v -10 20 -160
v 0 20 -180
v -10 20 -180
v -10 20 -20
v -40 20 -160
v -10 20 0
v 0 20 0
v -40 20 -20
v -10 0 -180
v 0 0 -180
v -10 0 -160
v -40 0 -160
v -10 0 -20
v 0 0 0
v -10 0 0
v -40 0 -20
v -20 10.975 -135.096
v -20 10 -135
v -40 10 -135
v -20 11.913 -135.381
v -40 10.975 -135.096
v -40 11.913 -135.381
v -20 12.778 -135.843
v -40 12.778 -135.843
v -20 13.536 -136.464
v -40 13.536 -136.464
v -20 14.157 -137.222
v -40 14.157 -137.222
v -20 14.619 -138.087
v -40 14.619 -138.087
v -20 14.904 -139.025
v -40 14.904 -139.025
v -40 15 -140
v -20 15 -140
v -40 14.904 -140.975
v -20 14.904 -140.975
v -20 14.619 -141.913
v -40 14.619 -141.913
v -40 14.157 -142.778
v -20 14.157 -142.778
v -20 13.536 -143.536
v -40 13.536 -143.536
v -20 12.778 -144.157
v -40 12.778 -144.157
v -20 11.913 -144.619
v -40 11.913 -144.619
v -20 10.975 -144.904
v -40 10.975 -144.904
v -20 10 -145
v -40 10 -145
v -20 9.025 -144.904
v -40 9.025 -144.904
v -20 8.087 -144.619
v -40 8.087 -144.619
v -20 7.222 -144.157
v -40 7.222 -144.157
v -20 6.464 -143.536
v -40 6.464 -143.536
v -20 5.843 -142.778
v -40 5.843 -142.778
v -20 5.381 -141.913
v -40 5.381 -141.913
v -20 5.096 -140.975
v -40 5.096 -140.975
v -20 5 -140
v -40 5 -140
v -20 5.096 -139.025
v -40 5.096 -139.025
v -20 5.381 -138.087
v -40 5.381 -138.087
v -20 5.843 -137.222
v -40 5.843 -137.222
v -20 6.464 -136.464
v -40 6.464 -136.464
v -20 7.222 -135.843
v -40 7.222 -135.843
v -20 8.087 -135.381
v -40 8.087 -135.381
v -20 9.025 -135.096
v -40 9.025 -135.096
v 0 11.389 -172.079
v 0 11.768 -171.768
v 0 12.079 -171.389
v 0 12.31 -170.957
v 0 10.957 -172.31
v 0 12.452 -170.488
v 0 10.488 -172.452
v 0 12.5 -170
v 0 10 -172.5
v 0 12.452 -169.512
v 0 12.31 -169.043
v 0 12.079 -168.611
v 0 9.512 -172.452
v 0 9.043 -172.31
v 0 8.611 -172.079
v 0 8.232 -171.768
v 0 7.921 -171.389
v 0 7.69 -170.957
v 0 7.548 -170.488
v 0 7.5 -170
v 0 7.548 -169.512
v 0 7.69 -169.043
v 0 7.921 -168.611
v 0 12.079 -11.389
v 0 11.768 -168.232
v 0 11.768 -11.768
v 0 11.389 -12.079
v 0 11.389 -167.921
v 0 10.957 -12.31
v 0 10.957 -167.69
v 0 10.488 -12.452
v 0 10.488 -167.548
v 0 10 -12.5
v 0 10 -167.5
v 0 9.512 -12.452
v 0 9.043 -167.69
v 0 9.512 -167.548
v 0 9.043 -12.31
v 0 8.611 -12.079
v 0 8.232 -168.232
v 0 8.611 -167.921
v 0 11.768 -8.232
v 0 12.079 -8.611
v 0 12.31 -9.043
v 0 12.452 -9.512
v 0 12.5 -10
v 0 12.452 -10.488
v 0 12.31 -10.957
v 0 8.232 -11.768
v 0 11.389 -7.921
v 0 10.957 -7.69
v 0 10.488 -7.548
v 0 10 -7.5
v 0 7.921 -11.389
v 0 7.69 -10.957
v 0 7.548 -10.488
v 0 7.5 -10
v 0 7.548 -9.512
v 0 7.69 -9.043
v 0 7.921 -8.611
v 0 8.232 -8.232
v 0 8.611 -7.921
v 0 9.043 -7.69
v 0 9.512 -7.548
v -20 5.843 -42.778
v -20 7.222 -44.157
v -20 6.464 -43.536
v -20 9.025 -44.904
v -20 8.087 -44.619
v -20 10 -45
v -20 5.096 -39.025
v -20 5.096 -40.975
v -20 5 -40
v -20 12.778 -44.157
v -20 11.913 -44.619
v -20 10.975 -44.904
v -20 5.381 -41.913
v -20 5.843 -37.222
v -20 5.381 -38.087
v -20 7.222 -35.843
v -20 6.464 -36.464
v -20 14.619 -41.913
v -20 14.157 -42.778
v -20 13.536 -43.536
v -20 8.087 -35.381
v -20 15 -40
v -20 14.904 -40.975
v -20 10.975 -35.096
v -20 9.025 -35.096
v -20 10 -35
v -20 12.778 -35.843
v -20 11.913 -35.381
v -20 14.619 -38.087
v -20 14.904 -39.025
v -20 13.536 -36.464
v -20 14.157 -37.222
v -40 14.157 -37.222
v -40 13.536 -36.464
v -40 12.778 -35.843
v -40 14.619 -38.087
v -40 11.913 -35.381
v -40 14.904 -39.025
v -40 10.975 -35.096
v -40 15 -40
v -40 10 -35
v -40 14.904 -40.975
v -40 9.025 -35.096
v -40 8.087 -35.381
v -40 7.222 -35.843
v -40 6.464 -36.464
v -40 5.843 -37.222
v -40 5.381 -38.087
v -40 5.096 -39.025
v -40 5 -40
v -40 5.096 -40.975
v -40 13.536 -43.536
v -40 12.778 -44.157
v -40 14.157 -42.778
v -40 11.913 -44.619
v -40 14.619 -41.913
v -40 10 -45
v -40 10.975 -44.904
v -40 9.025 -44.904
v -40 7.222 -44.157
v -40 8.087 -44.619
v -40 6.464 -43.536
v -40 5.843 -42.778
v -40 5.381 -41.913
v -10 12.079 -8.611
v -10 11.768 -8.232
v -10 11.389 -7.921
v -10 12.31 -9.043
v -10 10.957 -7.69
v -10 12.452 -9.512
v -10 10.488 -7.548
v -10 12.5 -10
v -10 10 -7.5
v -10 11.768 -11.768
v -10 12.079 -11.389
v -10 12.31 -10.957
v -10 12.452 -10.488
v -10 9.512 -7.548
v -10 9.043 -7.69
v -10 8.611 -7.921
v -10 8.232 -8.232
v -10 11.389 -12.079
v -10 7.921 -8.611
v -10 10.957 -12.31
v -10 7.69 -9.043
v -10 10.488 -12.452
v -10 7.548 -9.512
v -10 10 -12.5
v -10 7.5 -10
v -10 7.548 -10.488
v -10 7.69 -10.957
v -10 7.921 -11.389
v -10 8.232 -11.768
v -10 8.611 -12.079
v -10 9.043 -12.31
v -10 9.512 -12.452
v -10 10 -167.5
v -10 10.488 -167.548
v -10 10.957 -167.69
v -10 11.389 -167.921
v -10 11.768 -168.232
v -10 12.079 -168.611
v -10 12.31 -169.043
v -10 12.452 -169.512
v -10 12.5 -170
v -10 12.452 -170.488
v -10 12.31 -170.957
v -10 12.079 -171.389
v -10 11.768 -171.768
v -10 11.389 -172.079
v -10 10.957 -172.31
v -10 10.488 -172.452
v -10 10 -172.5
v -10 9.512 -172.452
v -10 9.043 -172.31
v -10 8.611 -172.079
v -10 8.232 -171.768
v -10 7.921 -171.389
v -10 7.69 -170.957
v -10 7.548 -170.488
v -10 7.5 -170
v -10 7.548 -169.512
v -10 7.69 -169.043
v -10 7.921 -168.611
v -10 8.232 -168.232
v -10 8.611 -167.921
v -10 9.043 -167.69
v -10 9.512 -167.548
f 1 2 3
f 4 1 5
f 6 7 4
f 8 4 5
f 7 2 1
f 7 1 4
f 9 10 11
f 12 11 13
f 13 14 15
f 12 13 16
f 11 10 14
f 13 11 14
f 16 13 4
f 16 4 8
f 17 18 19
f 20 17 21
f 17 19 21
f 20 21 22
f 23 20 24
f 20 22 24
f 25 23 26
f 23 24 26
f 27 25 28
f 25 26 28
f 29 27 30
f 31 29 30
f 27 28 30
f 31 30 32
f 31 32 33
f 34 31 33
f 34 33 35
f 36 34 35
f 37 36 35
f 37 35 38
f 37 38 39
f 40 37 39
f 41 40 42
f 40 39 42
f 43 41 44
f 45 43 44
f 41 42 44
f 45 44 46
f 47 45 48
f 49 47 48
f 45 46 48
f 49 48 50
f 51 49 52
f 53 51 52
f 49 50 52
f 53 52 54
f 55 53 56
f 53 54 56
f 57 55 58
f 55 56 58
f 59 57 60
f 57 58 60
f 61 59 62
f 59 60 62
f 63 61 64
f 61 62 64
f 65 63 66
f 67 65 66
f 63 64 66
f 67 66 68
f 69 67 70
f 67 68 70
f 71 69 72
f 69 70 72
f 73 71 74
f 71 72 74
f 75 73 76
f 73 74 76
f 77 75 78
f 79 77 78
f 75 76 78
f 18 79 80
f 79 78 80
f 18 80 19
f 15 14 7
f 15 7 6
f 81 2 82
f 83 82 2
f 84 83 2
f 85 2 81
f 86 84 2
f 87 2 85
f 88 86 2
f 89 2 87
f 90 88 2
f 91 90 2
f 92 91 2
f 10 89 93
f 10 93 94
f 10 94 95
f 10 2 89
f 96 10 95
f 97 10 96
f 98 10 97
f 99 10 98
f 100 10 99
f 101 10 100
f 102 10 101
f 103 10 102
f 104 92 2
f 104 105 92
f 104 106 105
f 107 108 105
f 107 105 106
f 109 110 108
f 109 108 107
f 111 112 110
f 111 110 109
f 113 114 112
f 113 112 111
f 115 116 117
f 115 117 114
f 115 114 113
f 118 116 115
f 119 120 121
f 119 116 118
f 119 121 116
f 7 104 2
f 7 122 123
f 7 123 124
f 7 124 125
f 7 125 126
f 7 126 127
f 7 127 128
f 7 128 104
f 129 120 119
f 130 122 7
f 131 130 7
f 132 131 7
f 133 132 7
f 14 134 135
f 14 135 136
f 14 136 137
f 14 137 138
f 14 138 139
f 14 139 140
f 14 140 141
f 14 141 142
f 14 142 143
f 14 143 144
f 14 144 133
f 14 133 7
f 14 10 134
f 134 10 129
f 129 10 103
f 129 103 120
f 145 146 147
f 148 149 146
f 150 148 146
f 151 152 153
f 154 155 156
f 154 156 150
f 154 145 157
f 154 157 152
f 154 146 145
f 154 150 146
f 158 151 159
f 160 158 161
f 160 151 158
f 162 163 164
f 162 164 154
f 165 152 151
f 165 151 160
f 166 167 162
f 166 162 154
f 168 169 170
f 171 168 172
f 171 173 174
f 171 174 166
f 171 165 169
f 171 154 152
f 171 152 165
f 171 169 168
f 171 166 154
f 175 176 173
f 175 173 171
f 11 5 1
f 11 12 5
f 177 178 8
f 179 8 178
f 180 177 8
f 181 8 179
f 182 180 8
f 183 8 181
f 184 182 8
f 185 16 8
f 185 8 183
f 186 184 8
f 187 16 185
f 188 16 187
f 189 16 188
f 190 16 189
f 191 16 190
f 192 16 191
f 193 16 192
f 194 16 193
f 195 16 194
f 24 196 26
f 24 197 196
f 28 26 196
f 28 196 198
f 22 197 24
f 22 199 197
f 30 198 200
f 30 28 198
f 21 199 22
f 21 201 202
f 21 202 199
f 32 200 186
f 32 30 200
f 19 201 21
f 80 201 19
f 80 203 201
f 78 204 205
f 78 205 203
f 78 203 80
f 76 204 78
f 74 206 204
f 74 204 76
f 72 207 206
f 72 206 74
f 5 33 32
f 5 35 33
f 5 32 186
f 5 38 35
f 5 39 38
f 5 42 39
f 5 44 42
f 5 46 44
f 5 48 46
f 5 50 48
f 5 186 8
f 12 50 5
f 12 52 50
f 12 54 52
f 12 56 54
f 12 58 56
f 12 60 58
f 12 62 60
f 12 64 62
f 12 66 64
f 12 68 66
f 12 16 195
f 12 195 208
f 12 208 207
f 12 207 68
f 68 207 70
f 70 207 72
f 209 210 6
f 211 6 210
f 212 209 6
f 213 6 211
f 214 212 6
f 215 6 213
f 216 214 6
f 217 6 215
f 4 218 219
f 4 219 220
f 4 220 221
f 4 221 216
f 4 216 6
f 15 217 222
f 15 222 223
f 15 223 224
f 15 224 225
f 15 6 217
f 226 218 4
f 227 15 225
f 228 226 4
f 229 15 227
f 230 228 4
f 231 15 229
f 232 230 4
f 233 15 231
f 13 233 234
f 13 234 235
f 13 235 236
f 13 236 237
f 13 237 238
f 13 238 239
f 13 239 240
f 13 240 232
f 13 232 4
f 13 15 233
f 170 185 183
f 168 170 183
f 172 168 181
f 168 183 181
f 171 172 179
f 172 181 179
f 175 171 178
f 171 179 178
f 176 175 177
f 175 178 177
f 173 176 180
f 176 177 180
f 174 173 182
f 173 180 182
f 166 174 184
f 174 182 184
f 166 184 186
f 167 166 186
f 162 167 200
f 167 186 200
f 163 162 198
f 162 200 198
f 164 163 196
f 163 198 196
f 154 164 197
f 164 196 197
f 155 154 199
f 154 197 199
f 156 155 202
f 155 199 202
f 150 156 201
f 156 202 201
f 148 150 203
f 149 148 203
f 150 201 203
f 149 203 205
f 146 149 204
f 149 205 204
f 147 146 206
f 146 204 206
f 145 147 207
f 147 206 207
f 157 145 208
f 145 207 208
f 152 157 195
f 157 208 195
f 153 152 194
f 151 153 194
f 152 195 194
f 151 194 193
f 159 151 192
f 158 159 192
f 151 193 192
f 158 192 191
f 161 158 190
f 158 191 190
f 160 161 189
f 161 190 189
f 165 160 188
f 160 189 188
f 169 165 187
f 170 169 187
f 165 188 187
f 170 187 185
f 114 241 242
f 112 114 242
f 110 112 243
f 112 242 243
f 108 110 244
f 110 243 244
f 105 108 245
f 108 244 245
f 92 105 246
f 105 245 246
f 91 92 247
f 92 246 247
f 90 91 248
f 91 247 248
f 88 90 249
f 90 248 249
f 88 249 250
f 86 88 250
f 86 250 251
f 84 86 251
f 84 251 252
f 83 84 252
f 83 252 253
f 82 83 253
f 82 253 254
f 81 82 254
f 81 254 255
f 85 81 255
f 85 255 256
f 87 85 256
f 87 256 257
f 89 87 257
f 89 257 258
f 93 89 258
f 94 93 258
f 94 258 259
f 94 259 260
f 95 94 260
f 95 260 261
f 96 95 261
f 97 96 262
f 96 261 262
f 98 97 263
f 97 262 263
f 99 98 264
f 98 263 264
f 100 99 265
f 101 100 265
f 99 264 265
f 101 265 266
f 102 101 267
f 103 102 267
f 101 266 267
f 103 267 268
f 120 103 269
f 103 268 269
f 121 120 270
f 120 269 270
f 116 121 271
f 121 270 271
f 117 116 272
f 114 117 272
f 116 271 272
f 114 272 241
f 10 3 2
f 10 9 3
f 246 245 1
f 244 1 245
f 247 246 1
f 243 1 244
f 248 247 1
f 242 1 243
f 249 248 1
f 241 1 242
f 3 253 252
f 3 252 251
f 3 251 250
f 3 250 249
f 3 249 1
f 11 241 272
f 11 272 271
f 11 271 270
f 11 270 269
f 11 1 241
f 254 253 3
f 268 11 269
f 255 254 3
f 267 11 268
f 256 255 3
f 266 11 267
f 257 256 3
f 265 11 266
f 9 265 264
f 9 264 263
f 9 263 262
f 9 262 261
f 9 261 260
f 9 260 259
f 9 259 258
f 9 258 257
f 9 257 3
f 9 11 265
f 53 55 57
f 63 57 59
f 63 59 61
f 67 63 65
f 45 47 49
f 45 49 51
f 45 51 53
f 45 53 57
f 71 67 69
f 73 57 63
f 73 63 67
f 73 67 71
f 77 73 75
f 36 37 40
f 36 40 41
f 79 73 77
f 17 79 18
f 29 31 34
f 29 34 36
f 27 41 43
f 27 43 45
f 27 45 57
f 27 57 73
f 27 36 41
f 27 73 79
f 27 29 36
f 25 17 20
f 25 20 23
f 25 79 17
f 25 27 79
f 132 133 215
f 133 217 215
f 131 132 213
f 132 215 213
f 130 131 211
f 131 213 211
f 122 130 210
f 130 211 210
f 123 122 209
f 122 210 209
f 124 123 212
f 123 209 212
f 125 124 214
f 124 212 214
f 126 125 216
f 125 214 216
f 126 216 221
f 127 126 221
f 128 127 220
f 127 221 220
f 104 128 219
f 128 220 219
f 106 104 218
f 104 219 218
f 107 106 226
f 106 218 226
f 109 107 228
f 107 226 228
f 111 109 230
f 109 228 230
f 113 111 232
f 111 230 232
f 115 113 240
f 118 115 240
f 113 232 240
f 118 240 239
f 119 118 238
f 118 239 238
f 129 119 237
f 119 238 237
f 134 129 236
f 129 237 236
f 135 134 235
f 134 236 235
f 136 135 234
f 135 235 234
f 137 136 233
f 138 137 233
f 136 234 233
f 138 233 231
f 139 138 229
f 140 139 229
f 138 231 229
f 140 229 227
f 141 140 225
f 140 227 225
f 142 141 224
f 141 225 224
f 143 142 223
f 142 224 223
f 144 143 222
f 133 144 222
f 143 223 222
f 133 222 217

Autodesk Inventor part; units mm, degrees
ref_plane "YZ Plane" through (0, 0, 0) normal (1, 0, 0) x (0, 1, 0)
ref_plane "XZ Plane" through (0, 0, 0) normal (0, 1, 0) x (-1, 0, 0)
ref_plane "XY Plane" through (0, 0, 0) normal (0, 0, 1) x (1, 0, 0)
sketch "Эскиз1" plane through (0, 0, 0) normal (0, 1, 0) x (-1, 0, 0)
  line L0 (0, 0) -> (10, 0)
  line L1 (10, 0) -> (10, -20)
  line L2 (10, -20) -> (40, -20)
  line L3 (40, -20) -> (40, -160)
  line L4 (40, -160) -> (10, -160)
  line L5 (10, -160) -> (10, -180)
  line L6 (10, -180) -> (0, -180)
  line L7 (0, -180) -> (0, 0)
  line L8 (40, -160) -> (35, -160)
  line L9 (40, -150) -> (40, -130)
  line L10 (40, -20) -> (35, -20)
  line L11 (40, -30) -> (40, -50)
  line L12 (40, -90) -> (35, -90)
  line L13 (35, -90) -> (35, -123)
  line L14 (35, -123) -> (40, -123)
  line L15 (35, -90) -> (35, -57)
  line L16 (35, -57) -> (40, -57)
  line L17 (40, -123) -> (40, -133)
  line L18 (40, -133) -> (35, -133)
  line L19 (35, -133) -> (35, -160)
  line L20 (40, -57) -> (40, -47)
  line L21 (40, -47) -> (35, -47)
  line L22 (35, -47) -> (35, -20)
  point P0 (40, -47)
  dimension "d0" = 10
  dimension "d1" = 20
  dimension "d2" = 30
  dimension "d3" = 140
  dimension "d4" = 20
  dimension "d54" = 33
  dimension "d55" = 33
  dimension "d56" = 10
  dimension "d57" = 10
extrude "Выдавливание1" add sketch "Эскиз1" along normal blind 20
sketch "Эскиз2" plane through (-10, 0, -20) normal (-1, 0, 0) x (0, 0, 1)
  line L0 (0, 0) -> (20, 0) projected
  line L1 (20, 0) -> (0, 0)
  line L2 (0, 0) -> (10, 0)
  line L3 (10, 0) -> (10, 10)
  line L4 (20, 20) -> (-160, 20) projected
  line L5 (10, 20) -> (10, 10)
  line L6 (-140, 0) -> (-140, 20) projected
  line L7 (-160, 20) -> (-140, 20)
  line L8 (-140, 20) -> (-150, 20)
  line L9 (-150, 20) -> (-150, 10)
  line L10 (-150, 0) -> (-150, 10)
  circle A0 centre (10, 10) radius 2.5
  circle A1 centre (-150, 10) radius 2.5
  dimension "d7" = 10
  dimension "d10" = 10
  dimension "d12" = 5
  dimension "d14" = 5
extrude "Выдавливание2" cut sketch "Эскиз2" against normal blind 44.25
thread "Резьба4" size "M5x0.8" class "6H" standard "ANSI Metric M Profile" full length
sketch "Эскиз3" plane through (-40, 0, -160) normal (-1, 0, 0) x (0, 0, 1)
  line L0 (140, 0) -> (140, 20) projected
  line L1 (140, 0) -> (140, 10)
  line L2 (140, 0) -> (70, 0)
  line L3 (160, 0) -> (-20, 0) projected
  line L4 (70, 10) -> (120, 10)
  line L5 (120, 10) -> (20, 10)
  line L6 (70, 10) -> (70, 0)
  circle A0 centre (120, 10) radius 5
  circle A1 centre (20, 10) radius 5
  line L7 (120, 10) -> (140, 10)
  dimension "d28" = 50
  dimension "d29" = 100
  dimension "d30" = 10
  dimension "d31" = 10
  dimension "d41" = 10
  dimension "d48" = 20
extrude "Выдавливание3" cut sketch "Эскиз3" against normal blind 20 contours A1 | L7 L4 A0 | A0 L4 L7
thread "Резьба7" size "M5x0.8" class "6H" standard "ANSI Metric M Profile" full length
thread "Резьба8" size "M10x1.5" class "6H" standard "ANSI Metric M Profile" full length
thread "Резьба9" size "M10x1.5" class "6H" standard "ANSI Metric M Profile" full length
properties part number "17701729.301318.007"
